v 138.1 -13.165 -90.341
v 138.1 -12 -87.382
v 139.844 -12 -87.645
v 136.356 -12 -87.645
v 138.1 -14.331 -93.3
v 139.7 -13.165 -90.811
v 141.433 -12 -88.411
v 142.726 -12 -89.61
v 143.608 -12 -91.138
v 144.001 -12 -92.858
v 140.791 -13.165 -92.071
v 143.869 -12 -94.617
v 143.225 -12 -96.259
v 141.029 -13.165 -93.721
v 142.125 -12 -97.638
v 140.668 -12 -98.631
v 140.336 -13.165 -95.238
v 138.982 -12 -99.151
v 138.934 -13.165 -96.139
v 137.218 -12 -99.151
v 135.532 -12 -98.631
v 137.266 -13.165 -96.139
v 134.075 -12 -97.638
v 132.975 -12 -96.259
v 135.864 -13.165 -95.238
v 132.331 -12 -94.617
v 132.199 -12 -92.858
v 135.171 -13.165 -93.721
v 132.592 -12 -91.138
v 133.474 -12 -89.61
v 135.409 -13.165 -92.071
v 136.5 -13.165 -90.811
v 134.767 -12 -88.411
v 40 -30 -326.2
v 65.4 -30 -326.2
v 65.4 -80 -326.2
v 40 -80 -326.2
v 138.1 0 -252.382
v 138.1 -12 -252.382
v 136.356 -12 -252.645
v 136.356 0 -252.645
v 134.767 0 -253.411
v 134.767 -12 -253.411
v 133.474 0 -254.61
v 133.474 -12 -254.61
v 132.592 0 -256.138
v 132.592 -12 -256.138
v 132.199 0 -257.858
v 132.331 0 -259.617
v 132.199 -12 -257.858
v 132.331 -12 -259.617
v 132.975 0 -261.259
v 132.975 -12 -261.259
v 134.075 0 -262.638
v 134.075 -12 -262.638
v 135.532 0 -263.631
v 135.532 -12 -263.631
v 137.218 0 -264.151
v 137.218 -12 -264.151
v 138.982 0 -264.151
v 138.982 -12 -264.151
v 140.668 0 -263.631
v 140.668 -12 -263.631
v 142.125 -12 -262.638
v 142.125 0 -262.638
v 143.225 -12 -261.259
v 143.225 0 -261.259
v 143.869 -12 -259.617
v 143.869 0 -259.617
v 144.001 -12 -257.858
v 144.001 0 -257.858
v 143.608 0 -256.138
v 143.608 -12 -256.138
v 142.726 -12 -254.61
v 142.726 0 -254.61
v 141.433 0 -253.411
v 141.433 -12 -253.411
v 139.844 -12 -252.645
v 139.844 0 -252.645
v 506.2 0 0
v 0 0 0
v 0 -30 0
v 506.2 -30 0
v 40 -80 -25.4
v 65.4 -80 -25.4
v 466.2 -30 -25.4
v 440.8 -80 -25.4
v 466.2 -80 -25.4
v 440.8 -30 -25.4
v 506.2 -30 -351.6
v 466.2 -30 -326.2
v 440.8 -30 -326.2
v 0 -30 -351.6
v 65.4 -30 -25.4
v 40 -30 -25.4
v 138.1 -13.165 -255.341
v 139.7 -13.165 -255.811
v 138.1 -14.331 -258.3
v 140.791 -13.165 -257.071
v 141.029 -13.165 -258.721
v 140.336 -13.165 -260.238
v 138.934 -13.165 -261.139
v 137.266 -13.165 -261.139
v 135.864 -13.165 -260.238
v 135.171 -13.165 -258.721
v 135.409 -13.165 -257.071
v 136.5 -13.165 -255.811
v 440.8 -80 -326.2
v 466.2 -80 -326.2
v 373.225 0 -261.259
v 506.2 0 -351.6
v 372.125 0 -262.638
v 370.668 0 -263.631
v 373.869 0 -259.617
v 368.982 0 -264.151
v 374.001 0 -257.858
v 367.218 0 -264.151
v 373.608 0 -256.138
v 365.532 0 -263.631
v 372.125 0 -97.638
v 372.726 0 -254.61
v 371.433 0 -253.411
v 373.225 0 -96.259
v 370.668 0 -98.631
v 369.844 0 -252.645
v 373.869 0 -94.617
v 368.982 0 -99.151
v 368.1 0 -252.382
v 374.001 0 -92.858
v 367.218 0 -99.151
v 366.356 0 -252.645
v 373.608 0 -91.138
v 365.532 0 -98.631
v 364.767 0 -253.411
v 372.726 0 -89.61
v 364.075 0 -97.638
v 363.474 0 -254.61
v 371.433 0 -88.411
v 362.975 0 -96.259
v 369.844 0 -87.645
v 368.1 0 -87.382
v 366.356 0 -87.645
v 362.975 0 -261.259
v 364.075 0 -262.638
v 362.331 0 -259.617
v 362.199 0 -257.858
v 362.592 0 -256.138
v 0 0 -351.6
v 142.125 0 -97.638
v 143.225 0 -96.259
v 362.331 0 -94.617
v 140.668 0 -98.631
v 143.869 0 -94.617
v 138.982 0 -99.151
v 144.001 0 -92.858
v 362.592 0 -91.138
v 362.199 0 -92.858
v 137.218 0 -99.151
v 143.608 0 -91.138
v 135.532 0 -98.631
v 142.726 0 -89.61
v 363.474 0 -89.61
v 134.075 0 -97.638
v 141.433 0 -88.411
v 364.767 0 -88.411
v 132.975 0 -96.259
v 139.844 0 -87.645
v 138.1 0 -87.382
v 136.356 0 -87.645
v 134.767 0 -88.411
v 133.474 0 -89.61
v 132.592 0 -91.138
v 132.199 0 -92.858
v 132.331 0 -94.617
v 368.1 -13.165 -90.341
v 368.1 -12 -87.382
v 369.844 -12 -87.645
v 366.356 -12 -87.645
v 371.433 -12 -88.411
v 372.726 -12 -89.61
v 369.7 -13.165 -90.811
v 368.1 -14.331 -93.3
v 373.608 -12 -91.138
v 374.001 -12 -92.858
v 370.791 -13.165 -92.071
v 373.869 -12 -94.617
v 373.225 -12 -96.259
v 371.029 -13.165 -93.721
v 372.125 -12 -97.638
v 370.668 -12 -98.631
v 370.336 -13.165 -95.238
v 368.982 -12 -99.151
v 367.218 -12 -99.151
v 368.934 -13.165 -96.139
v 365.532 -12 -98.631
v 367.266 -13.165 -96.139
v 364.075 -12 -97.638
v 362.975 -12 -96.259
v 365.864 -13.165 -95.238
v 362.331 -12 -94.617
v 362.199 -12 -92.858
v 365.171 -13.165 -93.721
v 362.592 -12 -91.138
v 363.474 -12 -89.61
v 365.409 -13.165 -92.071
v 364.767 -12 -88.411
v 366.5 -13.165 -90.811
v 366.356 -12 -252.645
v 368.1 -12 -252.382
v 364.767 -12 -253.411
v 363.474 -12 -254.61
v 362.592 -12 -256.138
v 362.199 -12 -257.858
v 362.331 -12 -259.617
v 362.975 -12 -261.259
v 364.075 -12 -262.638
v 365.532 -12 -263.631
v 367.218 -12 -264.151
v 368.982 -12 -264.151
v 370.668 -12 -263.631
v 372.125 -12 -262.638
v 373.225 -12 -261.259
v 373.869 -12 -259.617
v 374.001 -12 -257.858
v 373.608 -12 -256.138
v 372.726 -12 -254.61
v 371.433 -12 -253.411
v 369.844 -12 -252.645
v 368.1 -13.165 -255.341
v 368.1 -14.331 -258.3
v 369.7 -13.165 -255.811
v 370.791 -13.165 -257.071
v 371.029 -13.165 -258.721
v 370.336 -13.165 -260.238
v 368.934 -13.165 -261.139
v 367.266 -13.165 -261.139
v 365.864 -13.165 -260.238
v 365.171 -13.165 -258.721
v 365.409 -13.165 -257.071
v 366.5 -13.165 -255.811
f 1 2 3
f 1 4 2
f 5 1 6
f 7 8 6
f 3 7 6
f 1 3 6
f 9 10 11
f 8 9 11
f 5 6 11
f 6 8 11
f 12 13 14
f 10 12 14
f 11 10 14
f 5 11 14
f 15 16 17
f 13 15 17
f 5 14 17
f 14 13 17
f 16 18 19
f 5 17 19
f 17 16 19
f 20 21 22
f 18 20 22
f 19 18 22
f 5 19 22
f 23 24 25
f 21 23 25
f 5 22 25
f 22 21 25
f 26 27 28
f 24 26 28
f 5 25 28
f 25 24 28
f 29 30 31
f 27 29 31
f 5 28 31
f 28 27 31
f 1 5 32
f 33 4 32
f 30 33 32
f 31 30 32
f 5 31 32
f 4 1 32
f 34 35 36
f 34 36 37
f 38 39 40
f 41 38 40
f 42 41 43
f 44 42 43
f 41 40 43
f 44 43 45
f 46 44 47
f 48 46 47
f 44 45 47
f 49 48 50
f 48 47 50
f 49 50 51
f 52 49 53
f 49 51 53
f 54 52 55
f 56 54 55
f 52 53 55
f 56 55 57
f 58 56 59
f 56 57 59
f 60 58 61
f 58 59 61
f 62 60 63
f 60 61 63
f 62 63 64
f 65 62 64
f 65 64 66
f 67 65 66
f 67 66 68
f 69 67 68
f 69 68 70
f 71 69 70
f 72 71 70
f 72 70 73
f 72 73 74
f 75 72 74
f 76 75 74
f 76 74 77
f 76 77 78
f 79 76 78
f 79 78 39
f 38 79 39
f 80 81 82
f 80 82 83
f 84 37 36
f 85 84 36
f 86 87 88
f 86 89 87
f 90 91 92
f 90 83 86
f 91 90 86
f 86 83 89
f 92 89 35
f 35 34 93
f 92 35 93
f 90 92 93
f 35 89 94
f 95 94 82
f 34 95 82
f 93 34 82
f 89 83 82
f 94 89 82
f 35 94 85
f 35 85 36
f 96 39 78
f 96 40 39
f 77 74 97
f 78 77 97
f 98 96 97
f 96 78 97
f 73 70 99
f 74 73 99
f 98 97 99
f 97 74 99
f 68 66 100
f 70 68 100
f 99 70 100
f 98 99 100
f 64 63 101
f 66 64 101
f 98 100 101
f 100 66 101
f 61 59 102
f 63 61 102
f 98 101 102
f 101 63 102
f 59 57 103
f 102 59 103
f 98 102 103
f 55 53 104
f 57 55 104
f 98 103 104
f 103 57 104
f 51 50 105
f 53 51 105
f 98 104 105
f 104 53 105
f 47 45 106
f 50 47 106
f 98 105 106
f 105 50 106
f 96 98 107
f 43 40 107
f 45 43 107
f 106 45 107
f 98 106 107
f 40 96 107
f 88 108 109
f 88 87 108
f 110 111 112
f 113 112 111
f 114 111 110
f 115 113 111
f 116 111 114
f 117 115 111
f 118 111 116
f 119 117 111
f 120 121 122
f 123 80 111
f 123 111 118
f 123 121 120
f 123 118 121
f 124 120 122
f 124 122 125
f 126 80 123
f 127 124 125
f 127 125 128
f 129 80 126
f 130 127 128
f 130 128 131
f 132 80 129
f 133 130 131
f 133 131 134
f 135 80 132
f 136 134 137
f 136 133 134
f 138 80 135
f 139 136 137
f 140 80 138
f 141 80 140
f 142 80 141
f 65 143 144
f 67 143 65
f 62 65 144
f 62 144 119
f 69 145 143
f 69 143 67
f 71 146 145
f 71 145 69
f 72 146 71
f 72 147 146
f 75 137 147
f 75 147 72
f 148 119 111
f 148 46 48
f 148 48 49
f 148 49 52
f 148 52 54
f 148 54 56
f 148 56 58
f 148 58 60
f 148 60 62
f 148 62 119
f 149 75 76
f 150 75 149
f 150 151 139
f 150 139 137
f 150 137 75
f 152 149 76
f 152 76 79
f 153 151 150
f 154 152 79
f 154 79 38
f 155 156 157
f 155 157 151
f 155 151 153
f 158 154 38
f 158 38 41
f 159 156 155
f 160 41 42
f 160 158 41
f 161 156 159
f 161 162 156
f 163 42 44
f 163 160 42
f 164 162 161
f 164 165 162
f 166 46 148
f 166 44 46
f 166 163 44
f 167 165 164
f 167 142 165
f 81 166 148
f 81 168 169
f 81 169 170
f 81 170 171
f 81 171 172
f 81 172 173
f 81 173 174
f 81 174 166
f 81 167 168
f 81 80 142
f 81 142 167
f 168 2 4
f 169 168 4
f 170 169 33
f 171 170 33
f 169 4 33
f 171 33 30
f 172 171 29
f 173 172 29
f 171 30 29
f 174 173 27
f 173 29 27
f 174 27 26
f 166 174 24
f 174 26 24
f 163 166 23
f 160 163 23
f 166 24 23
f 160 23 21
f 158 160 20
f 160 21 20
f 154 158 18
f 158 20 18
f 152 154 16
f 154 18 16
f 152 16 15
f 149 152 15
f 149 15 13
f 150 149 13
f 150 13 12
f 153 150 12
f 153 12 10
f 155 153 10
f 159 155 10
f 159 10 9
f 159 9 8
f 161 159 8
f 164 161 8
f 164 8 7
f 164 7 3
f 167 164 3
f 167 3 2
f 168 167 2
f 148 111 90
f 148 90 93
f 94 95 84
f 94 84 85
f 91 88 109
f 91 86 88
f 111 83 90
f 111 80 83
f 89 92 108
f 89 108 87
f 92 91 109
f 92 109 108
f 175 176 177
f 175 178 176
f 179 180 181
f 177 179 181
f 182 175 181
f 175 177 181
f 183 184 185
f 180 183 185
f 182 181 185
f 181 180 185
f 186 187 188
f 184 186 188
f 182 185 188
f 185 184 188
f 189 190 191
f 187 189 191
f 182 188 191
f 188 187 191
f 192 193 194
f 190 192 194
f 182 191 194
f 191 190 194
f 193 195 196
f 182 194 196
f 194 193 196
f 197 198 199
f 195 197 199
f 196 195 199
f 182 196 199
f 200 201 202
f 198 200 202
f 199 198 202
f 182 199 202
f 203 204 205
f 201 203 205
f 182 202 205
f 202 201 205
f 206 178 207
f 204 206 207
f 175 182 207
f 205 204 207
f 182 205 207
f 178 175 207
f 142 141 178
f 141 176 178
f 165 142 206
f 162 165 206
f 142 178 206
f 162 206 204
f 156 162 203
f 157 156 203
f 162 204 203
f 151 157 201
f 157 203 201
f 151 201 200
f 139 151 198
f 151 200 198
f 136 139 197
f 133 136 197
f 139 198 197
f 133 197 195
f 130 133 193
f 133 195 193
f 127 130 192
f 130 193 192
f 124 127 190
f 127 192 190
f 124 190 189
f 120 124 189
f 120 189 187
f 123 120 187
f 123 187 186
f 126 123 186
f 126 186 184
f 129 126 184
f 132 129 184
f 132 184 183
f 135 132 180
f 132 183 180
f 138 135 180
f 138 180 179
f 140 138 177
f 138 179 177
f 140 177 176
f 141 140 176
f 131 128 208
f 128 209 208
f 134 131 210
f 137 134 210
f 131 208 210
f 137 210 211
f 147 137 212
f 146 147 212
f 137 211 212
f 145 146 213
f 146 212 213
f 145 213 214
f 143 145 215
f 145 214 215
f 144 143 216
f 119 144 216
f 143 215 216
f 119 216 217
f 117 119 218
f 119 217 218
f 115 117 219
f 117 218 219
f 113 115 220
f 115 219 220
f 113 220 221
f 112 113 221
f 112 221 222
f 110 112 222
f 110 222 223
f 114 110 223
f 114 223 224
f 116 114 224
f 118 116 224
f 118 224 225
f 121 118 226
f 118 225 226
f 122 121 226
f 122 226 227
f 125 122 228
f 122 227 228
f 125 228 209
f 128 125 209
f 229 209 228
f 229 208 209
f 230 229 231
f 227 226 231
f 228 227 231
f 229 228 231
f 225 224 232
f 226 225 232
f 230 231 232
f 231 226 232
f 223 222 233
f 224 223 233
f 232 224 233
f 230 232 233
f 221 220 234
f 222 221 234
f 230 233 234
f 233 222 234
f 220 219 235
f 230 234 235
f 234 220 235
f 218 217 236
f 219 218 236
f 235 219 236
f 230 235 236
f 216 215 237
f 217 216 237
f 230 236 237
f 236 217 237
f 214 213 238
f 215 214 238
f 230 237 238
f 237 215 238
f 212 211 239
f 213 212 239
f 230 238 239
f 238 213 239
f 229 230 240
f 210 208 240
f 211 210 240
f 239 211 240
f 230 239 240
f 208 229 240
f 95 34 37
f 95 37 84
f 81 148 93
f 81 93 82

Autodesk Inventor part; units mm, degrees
ref_plane "YZ Plane" through (0, 0, 0) normal (1, 0, 0) x (0, 1, 0)
ref_plane "XZ Plane" through (0, 0, 0) normal (0, 1, 0) x (-1, 0, 0)
ref_plane "XY Plane" through (0, 0, 0) normal (0, 0, 1) x (1, 0, 0)
sketch "Sketch1" plane through (0, 0, 0) normal (0, 1, 0) x (-1, 0, 0)
  line L0 (0, 0) -> (-506.2, 0)
  line L1 (-506.2, 0) -> (-506.2, -351.6)
  line L2 (-506.2, -351.6) -> (0, -351.6)
  line L3 (0, -351.6) -> (0, 0)
  dimension "d0" = 506.2
  dimension "d1" = 351.6
extrude "Extrusion1" add sketch "Sketch1" against normal blind 30
sketch "Sketch2" plane through (0, -30, 0) normal (0, -1, 0) x (1, 0, 0)
  line L0 (466.2, -326.2) -> (440.8, -326.2)
  line L1 (440.8, -326.2) -> (440.8, -25.4)
  line L2 (440.8, -25.4) -> (466.2, -25.4)
  line L3 (466.2, -25.4) -> (466.2, -326.2)
  line L4 (65.4, -326.2) -> (40, -326.2)
  line L5 (40, -326.2) -> (40, -25.4)
  line L6 (40, -25.4) -> (65.4, -25.4)
  line L7 (65.4, -25.4) -> (65.4, -326.2)
  line L8 (506.2, 0) -> (0, 0) projected
  line L9 (0, -351.6) -> (506.2, -351.6) projected
  line L10 (0, 0) -> (0, -351.6) projected
  dimension "d4" = 25.4
  dimension "d5" = 25.4
  dimension "d6" = 25.4
  dimension "d7" = 25.4
  dimension "d9" = 25.4
  dimension "d10" = 25.4
  dimension "d11" = 40
  dimension "d12" = 375.4
extrude "Extrusion2" add sketch "Sketch2" along normal blind 50
sketch "Sketch4" plane through (0, 0, 0) normal (0, 1, 0) x (1, 0, 0)
  line L0 (0, 351.6) -> (0, 0) projected
  line L1 (506.2, 351.6) -> (0, 351.6) projected
  line L2 (506.2, 0) -> (506.2, 351.6) projected
  point P0 (138.1, 258.3)
  point P1 (368.1, 258.3)
  point P2 (138.1, 93.3)
  point P3 (368.1, 93.3)
  dimension "d22" = 230
  dimension "d23" = 230
  dimension "d24" = 165
  dimension "d25" = 165
  dimension "d26" = 138.1
  dimension "d27" = 138.1
  dimension "d28" = 93.3
  dimension "d36" = 93.3
hole "Hole1" at (138.1, 0, -258.3) at (368.1, 0, -258.3) at (138.1, 0, -93.3) at (368.1, 0, -93.3) direction (0, -1, 0) diameter 11.835 depth 12 tip angle 137 thread size "M14x2" class "6H" standard "ISO Metric profile"
equation "\"d6\" = d4"
equation "\"d10\" = d9"
equation "\"d23\" = d22"
equation "\"d25\" = d24"
equation "\"d27\" = d26"
equation "\"d36\" = d28"
properties part number "Soporte de matriz"
